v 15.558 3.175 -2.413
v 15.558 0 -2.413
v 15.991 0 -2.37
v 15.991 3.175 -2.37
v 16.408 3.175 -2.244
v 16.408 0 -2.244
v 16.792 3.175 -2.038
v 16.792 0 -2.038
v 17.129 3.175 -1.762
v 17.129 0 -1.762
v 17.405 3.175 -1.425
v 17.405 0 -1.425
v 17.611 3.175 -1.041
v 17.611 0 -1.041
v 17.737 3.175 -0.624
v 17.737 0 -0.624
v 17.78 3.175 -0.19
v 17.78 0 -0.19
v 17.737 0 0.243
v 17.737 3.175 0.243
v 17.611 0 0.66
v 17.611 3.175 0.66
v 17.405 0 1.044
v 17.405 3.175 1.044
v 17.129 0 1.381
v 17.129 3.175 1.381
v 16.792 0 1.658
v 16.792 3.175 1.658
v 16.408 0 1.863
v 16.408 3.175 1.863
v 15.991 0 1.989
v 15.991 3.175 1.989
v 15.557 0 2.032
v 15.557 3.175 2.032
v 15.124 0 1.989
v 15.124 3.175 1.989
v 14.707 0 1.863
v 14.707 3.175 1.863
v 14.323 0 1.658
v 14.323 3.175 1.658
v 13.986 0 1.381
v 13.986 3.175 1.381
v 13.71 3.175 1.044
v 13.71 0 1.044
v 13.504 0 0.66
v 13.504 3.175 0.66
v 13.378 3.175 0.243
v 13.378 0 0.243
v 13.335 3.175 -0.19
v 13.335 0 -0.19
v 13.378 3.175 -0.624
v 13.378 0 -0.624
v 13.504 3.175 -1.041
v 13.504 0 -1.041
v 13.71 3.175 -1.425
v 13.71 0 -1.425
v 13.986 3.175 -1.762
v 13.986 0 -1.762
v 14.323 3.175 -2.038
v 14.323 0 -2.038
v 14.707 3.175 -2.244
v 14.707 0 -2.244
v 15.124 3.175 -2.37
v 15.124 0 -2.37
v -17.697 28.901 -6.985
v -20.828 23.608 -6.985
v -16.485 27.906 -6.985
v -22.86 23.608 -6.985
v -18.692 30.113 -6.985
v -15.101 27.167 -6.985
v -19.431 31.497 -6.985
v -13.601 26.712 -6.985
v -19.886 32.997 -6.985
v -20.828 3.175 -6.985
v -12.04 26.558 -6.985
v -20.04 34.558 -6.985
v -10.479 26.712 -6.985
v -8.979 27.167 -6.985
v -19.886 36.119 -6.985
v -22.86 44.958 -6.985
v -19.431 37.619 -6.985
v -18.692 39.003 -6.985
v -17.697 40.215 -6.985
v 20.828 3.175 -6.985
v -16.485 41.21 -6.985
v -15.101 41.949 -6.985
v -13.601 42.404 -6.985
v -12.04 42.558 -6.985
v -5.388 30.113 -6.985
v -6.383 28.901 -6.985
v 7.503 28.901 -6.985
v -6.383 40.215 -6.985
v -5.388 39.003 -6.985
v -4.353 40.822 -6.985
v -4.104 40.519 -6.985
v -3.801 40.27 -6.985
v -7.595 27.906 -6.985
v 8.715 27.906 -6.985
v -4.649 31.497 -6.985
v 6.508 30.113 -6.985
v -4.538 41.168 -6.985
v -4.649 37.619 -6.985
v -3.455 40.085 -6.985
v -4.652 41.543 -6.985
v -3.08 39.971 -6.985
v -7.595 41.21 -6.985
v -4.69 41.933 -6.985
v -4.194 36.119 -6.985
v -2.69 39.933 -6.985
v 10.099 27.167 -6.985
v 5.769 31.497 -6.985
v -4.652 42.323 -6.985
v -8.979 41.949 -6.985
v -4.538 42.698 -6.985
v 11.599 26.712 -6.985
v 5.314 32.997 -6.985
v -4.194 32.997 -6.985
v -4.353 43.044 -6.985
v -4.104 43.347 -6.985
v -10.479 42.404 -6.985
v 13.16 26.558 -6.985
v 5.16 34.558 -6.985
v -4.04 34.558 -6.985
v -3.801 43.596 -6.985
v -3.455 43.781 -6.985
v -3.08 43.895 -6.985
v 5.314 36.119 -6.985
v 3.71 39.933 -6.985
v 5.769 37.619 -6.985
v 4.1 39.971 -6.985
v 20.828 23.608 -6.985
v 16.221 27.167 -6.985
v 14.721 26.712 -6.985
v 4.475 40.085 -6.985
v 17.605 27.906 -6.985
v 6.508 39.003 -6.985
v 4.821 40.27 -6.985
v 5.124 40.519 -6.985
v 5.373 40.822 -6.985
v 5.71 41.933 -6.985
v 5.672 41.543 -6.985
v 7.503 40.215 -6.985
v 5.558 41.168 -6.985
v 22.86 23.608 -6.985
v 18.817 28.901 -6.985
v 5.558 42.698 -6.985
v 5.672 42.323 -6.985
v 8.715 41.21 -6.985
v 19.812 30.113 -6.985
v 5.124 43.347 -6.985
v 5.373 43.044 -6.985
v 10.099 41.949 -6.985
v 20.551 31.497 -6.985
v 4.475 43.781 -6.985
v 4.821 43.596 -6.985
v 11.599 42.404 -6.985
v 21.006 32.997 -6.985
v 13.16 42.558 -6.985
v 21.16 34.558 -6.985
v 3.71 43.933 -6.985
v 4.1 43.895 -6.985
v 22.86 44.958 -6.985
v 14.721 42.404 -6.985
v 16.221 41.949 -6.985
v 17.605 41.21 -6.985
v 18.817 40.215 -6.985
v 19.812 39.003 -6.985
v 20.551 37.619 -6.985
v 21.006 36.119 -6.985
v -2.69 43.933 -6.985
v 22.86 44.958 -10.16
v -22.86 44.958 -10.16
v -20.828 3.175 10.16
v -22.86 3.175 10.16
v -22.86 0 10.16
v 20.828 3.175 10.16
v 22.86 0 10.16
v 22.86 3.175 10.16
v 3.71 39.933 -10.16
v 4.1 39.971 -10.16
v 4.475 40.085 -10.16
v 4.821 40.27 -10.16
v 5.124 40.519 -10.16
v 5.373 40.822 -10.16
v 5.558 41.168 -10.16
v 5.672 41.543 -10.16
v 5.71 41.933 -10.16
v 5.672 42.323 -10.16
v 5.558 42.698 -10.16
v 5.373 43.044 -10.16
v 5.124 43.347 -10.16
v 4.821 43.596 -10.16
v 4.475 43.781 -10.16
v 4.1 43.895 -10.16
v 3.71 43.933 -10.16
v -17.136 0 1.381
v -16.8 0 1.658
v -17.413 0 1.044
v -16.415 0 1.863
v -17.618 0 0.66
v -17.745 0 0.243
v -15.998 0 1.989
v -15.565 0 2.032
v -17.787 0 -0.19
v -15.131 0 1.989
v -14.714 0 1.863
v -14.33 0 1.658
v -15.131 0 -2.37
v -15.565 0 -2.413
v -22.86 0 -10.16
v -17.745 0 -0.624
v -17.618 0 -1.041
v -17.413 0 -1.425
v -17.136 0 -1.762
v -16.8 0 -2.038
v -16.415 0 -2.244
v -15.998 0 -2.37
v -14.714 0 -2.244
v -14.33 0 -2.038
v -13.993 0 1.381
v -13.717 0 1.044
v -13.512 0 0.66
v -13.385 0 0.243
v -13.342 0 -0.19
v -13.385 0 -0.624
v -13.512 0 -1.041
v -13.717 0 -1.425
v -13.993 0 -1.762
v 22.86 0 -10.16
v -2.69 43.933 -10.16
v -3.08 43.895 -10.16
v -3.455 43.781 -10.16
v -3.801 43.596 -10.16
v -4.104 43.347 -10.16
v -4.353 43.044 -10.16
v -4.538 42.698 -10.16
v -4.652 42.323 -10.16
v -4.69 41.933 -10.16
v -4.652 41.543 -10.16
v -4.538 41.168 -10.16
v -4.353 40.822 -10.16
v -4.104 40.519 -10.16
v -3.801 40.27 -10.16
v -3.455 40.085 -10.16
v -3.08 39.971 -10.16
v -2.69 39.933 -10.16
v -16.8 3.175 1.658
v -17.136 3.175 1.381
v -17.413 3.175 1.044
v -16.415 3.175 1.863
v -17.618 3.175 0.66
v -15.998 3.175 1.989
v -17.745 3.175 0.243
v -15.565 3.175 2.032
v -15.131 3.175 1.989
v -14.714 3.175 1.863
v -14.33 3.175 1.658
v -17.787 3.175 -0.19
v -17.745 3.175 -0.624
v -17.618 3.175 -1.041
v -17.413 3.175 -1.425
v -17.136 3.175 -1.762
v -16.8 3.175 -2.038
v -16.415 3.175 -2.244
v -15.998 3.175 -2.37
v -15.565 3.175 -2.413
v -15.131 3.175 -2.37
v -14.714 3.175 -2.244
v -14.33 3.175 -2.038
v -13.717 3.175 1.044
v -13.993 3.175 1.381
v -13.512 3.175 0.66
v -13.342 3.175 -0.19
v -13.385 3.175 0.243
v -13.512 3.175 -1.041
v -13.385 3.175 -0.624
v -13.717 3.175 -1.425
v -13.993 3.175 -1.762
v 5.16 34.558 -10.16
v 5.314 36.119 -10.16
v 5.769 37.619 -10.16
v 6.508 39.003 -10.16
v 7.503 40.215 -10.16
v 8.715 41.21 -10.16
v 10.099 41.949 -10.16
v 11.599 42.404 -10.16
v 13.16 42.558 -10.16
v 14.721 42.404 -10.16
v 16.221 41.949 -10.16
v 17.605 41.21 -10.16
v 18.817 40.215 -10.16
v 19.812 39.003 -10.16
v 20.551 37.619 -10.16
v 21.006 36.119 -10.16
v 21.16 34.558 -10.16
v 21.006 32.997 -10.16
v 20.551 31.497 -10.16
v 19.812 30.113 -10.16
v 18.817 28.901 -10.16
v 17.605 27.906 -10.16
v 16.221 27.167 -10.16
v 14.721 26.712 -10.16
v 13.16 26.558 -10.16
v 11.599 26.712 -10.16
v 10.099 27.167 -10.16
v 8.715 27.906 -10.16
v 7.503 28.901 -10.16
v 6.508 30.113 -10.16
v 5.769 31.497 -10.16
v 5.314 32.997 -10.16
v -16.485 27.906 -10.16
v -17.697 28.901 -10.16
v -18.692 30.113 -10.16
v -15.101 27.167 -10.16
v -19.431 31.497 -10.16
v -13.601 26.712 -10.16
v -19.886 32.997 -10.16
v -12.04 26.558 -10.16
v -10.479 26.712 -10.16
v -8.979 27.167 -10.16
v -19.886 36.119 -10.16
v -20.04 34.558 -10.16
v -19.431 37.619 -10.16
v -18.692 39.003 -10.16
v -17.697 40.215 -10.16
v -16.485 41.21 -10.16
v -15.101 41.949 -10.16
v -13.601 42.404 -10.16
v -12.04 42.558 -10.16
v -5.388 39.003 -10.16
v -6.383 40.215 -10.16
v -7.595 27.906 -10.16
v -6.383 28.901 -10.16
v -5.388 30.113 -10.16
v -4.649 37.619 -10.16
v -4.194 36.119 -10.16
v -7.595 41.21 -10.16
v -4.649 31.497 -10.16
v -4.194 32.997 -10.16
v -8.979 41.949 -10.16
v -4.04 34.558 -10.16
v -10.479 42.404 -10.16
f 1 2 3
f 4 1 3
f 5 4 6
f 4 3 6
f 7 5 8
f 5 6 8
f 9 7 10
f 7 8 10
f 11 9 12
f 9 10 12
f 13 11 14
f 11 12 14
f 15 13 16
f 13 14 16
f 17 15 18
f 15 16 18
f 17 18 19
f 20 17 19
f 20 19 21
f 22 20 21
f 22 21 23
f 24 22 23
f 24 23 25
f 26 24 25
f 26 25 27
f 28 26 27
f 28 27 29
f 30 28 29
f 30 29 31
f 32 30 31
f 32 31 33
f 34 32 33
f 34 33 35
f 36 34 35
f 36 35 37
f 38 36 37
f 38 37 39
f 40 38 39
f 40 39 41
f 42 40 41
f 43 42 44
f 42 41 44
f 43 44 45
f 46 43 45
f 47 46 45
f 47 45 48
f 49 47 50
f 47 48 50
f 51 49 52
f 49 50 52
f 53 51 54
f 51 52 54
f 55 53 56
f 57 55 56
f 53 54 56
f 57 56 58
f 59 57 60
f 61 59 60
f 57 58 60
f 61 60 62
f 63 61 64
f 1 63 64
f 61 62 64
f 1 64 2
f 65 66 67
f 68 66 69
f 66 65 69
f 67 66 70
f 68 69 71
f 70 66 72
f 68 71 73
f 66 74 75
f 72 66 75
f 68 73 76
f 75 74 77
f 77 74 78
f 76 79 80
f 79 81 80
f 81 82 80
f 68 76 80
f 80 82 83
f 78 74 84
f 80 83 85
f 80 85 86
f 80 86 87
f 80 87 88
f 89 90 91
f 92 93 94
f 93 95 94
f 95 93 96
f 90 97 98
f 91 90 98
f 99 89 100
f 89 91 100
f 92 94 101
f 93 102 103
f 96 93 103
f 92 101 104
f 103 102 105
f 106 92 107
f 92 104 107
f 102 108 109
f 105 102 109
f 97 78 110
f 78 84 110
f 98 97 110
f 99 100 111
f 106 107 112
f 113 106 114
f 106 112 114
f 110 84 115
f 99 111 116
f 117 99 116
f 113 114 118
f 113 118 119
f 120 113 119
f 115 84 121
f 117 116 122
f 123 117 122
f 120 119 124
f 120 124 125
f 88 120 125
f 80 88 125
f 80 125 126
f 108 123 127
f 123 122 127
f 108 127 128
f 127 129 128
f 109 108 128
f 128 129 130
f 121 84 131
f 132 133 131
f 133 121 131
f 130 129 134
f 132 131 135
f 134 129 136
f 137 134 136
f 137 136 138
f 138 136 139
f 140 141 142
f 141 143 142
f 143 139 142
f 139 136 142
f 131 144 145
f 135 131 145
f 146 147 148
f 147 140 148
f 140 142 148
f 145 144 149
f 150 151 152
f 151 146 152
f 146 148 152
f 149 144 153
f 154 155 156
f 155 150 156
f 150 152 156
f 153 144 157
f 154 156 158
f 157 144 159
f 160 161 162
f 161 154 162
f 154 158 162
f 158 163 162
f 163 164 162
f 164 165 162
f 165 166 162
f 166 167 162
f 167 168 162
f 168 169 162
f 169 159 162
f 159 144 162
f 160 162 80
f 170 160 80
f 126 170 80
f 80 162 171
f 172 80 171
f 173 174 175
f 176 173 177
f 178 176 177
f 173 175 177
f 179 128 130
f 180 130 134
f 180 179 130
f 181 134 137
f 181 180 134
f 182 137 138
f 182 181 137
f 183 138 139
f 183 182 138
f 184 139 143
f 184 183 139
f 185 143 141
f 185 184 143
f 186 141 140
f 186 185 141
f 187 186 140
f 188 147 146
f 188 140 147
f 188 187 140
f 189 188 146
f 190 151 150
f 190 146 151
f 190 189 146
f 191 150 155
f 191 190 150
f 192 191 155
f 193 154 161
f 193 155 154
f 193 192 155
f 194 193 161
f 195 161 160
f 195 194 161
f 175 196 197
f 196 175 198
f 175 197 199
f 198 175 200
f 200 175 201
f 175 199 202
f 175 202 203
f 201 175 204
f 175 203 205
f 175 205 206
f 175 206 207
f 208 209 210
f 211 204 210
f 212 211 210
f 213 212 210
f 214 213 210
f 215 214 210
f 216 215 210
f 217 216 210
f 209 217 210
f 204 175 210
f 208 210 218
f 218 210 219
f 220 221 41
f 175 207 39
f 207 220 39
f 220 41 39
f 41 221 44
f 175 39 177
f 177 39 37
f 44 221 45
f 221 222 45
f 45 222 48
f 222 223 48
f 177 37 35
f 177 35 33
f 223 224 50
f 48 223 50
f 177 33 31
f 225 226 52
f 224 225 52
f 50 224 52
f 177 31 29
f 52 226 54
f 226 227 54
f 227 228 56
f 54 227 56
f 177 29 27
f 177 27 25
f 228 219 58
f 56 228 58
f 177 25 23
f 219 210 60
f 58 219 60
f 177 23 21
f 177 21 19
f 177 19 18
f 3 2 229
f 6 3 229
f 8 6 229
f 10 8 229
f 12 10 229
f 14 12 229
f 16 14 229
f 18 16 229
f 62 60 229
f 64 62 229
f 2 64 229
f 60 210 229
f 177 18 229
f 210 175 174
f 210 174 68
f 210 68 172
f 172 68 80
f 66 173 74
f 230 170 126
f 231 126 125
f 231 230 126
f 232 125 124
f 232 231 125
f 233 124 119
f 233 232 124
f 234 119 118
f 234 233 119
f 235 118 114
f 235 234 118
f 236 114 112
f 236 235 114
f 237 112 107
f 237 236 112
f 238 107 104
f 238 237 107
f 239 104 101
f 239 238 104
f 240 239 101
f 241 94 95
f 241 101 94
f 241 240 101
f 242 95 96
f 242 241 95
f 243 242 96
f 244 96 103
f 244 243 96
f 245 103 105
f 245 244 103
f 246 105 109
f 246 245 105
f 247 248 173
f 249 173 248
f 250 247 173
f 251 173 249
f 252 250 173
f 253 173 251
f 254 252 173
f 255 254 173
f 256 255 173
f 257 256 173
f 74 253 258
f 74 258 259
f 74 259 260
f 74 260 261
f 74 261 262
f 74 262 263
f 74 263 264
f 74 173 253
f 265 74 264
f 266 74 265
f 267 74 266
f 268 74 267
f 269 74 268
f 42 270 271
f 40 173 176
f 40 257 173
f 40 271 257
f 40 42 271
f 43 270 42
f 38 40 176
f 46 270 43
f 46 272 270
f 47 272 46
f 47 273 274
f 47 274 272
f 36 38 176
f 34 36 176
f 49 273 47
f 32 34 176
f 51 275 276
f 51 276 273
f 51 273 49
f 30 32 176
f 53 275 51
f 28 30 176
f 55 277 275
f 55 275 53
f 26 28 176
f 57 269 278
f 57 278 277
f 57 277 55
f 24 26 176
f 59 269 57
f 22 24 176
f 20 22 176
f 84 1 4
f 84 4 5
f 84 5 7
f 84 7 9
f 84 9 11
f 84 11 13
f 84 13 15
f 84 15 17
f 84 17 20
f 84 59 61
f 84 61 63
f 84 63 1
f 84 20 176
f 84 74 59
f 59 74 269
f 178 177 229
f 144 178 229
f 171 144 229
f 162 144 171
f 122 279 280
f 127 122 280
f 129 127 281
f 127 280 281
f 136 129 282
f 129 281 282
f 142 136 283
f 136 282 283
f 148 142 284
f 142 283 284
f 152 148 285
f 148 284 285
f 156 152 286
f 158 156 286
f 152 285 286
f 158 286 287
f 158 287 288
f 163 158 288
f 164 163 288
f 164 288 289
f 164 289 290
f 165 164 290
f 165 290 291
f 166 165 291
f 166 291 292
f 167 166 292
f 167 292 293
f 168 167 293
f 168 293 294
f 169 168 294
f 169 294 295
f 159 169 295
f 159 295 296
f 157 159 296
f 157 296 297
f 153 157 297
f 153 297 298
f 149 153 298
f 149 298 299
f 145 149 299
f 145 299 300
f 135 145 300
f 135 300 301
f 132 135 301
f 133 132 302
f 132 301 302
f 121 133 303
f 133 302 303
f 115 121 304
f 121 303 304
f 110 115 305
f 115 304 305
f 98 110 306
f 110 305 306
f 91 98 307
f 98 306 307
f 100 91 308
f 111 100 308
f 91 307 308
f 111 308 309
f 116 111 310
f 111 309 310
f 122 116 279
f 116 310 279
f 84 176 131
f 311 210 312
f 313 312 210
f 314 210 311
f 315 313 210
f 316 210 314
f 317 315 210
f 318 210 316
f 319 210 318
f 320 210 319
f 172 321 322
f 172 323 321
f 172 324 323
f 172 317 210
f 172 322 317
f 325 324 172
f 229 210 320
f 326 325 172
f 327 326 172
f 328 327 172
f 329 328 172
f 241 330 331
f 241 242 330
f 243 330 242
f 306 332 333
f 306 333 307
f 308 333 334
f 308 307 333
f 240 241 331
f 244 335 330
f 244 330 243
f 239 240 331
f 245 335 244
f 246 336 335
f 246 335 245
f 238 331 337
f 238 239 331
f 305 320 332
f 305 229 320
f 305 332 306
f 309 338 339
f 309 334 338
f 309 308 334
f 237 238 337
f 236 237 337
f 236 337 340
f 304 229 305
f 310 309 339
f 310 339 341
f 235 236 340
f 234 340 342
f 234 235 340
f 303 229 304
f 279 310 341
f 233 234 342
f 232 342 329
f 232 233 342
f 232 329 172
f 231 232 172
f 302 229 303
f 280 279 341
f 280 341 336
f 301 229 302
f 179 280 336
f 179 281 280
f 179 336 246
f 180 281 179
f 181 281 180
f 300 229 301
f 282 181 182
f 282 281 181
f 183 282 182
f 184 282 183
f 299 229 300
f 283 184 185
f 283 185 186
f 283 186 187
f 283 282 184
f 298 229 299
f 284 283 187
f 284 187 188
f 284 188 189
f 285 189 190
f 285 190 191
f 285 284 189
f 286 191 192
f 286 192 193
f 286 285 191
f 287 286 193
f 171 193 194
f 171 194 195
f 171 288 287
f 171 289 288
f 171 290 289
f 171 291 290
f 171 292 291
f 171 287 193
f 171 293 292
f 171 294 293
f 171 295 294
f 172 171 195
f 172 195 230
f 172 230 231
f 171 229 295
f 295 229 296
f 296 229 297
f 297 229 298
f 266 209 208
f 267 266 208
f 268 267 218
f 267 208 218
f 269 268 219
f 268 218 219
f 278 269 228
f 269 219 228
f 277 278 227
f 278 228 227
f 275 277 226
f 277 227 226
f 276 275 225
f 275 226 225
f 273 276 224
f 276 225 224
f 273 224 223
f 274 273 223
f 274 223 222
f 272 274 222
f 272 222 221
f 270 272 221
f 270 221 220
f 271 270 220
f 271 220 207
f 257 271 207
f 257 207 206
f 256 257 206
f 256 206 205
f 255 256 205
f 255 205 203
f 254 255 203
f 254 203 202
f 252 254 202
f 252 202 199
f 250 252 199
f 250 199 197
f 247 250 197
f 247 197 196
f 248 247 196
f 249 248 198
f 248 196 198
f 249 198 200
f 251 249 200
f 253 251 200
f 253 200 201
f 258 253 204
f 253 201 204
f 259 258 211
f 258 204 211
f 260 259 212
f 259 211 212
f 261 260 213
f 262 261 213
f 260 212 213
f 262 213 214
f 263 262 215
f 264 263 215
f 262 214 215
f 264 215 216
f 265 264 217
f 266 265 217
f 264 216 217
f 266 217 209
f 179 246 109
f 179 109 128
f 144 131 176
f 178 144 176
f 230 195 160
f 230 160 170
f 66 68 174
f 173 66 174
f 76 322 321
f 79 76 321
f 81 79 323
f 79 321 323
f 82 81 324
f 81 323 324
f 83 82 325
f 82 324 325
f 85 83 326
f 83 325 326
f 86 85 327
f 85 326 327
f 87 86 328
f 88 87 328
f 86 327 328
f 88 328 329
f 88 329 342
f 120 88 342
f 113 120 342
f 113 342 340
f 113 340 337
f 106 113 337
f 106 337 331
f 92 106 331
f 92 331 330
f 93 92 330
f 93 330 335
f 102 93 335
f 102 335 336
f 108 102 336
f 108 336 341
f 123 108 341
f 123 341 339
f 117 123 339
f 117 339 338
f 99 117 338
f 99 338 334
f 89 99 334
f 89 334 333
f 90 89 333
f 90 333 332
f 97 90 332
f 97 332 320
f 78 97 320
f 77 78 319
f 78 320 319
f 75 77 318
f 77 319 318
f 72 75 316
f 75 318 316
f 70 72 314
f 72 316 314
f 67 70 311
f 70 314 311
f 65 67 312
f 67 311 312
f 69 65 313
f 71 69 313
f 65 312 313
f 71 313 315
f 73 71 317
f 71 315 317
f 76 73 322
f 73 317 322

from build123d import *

# Parameters (mm, degrees)
SKETCH1_W           = 45.72
SKETCH1_H           = 20.32
BOSS_EXTRUDE1_DEPTH = 3.175
SKETCH2_W           = 3.175
SKETCH2_H           = 41.783
BOSS_EXTRUDE2_DEPTH = 45.72
SWEEP1_START        = -22.86
SWEEP1_DEPTH        = 2.032
SWEEP1_START_2      = 20.828
SWEEP1_2_DEPTH      = 2.032
SKETCH5_R           = 8
CUT_EXTRUDE1_DEPTH  = 55.375580585
SKETCH6_R           = 2.2225
CUT_EXTRUDE2_DEPTH  = 52.449265923


# Read off the part's stored shape, not the designer's step: Sweep1
with BuildPart() as part:
    # Sketch1 → Boss-Extrude1 (new body)
    with BuildSketch(Plane(origin=(0, 0, 0), x_dir=(1, 0, 0), z_dir=(0, 1, 0))):
        Rectangle(SKETCH1_W, SKETCH1_H)
    extrude(amount=BOSS_EXTRUDE1_DEPTH)

    # Sketch2 → Boss-Extrude2 (add)
    with BuildSketch(Plane(origin=(22.86, 0, 0), x_dir=(0, 0, -1), z_dir=(1, 0, 0))):
        with Locations((8.5725, 24.0665)):
            Rectangle(SKETCH2_W, SKETCH2_H)
    extrude(amount=-BOSS_EXTRUDE2_DEPTH)

    # Sweep1 outline → Sweep1 (add)
    with BuildSketch(Plane.YZ.offset(SWEEP1_START)):
        Polygon((3.175, -6.985), (23.607615345, -6.985), (3.175, 10.16), align=None)
    extrude(amount=SWEEP1_DEPTH)

    # Sweep1 2 outline → Sweep1 2 (add)
    with BuildSketch(Plane.YZ.offset(SWEEP1_START_2)):
        Polygon((3.175, -6.985), (23.607615345, -6.985), (3.175, 10.16), align=None)
    extrude(amount=SWEEP1_2_DEPTH)

    # Sketch5 → Cut-Extrude1 (cut, through all)
    with BuildSketch(Plane(origin=(0, 0, -10.16), x_dir=(-1, 0, 0), z_dir=(0, 0, -1))):
        with Locations((-13.16, 34.558)):
            Circle(SKETCH5_R)
        with Locations((12.04, 34.558)):
            Circle(SKETCH5_R)
        with BuildLine():
            Line((-3.71, 43.933), (2.69, 43.933))
            ThreePointArc((2.69, 43.933), (4.69, 41.933), (2.69, 39.933))
            Line((2.69, 39.933), (-3.71, 39.933))
            ThreePointArc((-3.71, 39.933), (-5.71, 41.933), (-3.71, 43.933))
        make_face()
    extrude(amount=-CUT_EXTRUDE1_DEPTH, mode=Mode.SUBTRACT)

    # Sketch6 → Cut-Extrude2 (cut, through all)
    with BuildSketch(Plane.XZ):
        with Locations(Location((-15.564885413, -0.190388698, 0), (0, 0, 270))):
            Circle(SKETCH6_R)
        with Locations(Location((15.5575, -0.190388698, 0), (0, 0, 270))):
            Circle(SKETCH6_R)
    extrude(amount=-CUT_EXTRUDE2_DEPTH, mode=Mode.SUBTRACT)


solid = part.part
